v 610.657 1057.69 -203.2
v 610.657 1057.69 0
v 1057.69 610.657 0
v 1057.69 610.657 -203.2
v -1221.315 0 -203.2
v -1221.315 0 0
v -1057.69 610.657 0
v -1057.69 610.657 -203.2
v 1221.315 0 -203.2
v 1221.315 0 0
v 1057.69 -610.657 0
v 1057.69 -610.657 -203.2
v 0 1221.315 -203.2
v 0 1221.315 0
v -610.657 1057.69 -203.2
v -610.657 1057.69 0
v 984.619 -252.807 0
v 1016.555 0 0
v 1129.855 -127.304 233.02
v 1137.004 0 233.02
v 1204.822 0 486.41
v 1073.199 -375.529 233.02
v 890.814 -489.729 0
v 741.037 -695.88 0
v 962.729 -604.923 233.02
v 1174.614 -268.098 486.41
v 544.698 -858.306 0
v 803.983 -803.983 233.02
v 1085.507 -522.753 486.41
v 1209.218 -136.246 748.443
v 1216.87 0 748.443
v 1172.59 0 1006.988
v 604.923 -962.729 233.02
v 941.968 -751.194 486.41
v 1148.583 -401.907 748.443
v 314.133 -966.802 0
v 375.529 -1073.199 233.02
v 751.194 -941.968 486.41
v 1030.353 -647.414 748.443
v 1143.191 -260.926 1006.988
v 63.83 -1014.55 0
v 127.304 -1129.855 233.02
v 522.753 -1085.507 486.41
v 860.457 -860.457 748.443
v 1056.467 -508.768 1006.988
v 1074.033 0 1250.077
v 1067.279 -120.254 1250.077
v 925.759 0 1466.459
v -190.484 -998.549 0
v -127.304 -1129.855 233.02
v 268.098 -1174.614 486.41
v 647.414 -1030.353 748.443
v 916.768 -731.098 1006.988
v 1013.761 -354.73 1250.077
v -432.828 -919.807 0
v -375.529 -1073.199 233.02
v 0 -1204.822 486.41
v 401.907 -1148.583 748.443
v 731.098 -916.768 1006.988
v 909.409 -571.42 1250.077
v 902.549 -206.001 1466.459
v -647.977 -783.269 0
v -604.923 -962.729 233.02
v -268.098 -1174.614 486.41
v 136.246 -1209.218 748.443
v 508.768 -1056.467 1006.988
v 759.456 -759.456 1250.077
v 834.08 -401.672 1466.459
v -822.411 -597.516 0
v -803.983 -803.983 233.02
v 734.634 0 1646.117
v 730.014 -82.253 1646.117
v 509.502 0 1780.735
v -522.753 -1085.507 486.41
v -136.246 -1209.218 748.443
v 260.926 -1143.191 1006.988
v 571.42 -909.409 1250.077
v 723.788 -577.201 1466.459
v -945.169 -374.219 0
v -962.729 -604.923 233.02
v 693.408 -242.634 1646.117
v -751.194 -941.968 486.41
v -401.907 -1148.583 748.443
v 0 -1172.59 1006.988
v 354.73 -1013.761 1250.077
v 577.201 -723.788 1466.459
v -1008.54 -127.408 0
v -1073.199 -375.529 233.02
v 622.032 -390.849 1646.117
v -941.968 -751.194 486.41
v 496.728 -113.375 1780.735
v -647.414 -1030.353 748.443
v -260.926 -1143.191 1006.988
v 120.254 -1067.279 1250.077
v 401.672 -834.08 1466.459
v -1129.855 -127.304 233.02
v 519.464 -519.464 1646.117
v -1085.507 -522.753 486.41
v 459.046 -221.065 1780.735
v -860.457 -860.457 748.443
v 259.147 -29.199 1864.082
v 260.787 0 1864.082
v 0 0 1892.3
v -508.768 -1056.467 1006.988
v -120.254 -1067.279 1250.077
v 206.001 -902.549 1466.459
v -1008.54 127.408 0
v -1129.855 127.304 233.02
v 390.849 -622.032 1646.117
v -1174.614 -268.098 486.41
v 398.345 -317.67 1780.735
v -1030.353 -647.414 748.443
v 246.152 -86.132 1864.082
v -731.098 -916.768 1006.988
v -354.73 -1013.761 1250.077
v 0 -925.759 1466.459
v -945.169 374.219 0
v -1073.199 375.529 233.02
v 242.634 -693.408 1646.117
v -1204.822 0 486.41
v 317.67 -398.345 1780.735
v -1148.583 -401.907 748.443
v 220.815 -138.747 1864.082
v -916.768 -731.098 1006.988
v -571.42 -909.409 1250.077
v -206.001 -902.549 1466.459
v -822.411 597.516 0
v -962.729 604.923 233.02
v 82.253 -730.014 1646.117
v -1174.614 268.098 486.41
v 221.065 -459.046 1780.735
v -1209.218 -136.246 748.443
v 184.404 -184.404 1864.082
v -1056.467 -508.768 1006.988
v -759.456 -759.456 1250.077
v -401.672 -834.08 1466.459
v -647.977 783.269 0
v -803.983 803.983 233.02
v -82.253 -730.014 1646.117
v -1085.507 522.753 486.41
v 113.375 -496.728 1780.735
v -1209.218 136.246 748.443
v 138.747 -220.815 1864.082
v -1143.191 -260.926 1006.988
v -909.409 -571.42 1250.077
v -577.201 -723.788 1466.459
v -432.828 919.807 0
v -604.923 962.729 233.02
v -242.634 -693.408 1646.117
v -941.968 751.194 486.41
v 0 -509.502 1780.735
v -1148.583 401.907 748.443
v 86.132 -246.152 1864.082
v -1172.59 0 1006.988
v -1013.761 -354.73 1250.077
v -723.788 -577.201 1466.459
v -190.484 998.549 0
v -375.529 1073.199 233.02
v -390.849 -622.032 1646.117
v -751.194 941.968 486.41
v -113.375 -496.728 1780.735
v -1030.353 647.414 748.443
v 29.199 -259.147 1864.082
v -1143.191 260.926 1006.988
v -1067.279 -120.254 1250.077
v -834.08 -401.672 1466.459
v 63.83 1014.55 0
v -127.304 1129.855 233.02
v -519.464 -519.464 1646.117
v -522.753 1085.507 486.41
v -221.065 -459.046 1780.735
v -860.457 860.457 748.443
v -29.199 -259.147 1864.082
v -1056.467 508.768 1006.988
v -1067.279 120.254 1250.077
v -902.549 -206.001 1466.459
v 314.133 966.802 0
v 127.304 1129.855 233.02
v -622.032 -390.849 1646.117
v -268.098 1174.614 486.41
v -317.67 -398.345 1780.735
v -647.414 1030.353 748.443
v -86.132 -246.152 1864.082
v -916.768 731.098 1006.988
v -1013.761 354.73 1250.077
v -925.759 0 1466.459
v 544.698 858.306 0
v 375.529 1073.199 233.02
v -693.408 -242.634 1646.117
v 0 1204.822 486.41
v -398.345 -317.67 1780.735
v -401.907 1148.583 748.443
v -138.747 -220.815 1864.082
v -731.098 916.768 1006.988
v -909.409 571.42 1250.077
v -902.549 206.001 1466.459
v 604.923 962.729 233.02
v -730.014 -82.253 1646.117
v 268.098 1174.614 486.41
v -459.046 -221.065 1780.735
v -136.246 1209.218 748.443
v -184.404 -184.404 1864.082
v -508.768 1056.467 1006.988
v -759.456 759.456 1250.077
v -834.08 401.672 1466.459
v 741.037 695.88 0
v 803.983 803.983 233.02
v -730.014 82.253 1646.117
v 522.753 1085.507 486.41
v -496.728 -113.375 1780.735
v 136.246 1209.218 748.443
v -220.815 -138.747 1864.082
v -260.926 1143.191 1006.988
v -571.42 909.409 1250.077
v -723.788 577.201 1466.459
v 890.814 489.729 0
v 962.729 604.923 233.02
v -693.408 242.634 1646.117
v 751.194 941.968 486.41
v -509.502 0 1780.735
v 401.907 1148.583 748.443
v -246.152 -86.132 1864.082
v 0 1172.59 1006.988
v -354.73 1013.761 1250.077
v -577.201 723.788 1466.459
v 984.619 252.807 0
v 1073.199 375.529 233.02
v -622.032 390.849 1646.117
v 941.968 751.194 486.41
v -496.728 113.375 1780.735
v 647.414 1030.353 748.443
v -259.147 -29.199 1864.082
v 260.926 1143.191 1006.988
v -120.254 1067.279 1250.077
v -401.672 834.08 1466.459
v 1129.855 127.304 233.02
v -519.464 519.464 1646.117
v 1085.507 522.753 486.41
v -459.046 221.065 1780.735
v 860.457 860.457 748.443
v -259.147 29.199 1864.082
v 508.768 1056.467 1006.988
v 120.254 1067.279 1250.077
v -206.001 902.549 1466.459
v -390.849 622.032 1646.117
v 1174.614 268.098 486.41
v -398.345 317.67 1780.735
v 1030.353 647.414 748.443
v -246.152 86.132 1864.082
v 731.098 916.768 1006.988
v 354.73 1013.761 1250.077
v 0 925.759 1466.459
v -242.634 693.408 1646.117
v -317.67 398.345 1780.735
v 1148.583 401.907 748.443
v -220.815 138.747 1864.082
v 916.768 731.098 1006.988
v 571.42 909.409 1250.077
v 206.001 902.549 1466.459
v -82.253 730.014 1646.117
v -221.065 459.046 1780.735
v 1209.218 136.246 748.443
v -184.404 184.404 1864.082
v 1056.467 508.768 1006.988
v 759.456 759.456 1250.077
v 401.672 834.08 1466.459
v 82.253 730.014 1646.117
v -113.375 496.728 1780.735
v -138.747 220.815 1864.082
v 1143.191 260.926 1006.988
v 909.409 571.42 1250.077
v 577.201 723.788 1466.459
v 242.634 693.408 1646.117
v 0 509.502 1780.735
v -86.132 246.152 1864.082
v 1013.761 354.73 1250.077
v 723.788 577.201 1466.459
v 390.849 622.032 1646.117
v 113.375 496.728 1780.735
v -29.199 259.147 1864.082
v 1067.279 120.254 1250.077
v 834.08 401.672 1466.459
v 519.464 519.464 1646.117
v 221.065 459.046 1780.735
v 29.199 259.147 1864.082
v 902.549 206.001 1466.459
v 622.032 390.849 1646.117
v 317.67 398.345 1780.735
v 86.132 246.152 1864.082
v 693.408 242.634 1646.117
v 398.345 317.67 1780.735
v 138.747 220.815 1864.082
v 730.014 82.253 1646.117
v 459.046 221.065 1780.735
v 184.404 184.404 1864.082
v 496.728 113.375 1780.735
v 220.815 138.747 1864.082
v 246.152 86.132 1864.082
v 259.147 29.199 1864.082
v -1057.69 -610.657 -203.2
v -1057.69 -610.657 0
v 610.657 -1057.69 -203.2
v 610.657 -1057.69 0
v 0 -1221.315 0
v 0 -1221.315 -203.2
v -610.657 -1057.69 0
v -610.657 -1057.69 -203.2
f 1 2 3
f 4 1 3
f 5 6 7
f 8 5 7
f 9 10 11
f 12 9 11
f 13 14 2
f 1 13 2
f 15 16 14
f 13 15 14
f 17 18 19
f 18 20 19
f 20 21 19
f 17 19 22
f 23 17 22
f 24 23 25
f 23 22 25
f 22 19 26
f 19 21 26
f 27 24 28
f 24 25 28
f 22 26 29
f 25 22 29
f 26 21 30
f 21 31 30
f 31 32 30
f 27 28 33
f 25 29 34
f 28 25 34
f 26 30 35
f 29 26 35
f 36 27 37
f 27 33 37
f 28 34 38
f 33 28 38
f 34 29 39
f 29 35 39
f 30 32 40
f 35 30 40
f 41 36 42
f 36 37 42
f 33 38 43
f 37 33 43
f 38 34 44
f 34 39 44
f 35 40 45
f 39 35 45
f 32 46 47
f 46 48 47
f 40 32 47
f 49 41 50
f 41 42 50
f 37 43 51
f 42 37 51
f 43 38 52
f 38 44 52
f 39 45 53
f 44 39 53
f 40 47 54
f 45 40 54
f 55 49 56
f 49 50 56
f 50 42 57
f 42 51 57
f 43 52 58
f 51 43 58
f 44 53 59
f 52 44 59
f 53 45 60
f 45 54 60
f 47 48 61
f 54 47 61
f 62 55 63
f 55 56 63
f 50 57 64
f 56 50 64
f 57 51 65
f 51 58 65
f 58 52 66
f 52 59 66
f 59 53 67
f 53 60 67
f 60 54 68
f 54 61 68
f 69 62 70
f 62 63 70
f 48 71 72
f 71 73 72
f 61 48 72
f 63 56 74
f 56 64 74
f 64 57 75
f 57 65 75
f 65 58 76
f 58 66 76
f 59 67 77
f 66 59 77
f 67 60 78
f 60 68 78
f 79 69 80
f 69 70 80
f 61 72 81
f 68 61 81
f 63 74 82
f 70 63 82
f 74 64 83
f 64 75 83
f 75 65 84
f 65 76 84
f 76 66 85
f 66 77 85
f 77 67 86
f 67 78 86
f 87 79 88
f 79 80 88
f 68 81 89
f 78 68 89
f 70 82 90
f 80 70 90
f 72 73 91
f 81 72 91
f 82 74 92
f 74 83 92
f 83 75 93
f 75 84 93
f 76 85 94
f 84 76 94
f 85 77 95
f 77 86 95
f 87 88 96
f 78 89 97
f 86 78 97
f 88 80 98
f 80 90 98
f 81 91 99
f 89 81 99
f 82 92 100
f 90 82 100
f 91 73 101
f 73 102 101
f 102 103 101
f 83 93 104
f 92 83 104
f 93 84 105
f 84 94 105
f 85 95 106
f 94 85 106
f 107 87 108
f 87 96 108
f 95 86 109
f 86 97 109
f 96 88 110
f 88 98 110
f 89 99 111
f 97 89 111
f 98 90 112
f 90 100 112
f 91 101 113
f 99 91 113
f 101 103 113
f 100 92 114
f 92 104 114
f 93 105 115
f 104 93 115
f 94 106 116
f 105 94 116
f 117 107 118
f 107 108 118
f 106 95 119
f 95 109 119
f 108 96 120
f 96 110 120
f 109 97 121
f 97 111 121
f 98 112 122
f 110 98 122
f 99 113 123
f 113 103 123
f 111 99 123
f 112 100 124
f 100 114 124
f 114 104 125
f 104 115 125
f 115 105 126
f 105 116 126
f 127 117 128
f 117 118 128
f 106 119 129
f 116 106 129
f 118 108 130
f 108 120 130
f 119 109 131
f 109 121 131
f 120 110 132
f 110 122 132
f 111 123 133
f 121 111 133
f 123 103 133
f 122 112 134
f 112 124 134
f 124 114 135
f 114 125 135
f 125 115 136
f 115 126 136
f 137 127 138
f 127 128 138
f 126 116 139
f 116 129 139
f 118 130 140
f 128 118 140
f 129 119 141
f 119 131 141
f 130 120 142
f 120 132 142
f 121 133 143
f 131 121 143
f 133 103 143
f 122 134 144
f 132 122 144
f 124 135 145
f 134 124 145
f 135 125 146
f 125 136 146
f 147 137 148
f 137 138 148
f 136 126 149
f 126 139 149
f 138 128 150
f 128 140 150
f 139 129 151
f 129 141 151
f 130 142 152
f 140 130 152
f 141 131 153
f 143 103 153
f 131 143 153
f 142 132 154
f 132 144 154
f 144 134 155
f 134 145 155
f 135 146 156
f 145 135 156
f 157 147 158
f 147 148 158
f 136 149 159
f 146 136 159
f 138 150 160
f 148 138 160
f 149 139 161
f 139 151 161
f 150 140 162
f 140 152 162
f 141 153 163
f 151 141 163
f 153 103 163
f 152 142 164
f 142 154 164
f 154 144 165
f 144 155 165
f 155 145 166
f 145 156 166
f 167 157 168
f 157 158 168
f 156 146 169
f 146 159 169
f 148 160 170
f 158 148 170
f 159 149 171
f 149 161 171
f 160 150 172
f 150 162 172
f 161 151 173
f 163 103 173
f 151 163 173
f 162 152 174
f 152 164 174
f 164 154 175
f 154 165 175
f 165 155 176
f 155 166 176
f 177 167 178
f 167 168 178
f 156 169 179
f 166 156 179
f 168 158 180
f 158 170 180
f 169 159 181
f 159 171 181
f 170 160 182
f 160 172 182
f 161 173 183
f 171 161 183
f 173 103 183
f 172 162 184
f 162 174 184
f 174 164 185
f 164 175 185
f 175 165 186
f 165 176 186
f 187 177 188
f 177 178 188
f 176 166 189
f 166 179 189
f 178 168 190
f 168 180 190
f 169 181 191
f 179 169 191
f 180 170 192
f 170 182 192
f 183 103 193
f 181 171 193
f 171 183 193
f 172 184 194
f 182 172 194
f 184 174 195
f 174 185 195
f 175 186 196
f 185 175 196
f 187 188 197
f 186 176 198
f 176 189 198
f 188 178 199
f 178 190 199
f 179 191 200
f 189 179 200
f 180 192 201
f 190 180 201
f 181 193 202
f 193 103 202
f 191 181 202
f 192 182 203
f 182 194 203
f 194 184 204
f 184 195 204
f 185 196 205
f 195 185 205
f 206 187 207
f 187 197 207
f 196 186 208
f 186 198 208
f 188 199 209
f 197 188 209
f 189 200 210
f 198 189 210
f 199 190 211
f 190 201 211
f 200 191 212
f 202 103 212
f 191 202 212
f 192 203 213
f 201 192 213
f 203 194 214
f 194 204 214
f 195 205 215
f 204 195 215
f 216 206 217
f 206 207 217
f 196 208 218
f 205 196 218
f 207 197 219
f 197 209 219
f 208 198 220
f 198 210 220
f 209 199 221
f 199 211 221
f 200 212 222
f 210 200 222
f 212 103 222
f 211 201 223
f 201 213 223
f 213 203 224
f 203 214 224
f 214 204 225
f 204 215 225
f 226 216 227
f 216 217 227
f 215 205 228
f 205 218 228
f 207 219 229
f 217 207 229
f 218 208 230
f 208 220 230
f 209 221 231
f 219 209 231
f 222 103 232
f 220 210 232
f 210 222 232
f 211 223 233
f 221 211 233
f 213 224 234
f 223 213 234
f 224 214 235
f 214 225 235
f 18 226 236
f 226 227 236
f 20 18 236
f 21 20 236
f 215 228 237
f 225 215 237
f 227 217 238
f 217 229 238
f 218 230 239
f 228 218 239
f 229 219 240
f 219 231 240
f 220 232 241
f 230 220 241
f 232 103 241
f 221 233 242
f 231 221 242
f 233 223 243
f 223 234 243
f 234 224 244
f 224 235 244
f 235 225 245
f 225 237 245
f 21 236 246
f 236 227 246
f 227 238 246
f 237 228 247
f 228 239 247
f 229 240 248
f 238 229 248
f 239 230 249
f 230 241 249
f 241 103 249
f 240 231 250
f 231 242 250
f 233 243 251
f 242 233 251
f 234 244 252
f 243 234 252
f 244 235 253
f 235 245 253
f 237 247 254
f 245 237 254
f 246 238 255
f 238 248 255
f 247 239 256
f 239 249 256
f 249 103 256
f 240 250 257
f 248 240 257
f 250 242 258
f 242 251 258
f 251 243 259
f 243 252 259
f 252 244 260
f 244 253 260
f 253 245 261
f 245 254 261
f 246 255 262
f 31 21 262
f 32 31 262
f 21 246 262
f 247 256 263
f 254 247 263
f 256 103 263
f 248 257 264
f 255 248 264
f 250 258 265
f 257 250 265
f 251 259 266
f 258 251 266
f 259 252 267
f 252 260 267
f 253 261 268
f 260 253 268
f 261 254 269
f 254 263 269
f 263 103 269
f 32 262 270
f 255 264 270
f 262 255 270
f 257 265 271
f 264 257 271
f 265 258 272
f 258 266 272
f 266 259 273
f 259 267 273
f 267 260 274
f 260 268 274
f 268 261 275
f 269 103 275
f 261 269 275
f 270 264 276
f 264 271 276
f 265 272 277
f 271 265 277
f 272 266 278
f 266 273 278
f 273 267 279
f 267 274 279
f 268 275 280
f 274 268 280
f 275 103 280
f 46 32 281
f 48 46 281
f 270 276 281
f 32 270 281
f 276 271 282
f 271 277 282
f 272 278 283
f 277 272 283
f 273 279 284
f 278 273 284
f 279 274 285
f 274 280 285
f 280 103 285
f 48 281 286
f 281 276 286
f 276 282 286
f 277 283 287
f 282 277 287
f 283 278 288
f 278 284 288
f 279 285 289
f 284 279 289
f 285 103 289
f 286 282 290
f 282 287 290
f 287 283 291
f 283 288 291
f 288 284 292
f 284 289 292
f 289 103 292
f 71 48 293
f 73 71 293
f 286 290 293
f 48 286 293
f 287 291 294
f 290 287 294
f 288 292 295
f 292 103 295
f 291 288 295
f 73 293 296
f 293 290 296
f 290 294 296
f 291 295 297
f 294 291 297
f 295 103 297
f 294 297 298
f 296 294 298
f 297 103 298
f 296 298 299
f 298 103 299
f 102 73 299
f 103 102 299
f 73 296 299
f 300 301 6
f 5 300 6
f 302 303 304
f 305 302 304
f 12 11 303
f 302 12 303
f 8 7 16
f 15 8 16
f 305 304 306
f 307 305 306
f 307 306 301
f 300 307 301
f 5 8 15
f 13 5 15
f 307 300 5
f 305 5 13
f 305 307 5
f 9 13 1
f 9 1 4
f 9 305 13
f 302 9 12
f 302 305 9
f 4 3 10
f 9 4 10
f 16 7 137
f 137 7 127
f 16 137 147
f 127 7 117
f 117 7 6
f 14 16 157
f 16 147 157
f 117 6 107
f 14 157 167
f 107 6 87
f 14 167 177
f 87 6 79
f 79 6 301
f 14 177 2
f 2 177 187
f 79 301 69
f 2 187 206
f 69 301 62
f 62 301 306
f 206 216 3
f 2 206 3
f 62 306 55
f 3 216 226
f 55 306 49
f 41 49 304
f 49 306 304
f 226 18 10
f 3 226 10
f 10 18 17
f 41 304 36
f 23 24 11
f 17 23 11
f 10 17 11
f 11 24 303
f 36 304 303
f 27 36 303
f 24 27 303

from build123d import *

# Parameters (mm, degrees)
F2_R     = 1524
F3_DEPTH = 914.4
F5_DEPTH = 203.2


with BuildPart() as f1:
    # F0 (on Front) → F1 (revolve)
    with BuildSketch(Plane.XZ):
        with BuildLine():
            Line((0, 1892.3), (0, -546.1))
            ThreePointArc((0, -546.1), (1219.2, 673.1), (0, 1892.3))
        make_face()
    revolve(axis=Axis((0, 0, 673.1), (0, 0, -1)))

    # F2 (on Top) → F3 (cut)
    with BuildSketch(Plane.XY):
        Circle(F2_R)
    extrude(amount=-F3_DEPTH, mode=Mode.SUBTRACT)

    # F4 (on face) → F5 (join)
    with BuildSketch(Plane(origin=(0, 0, 0), x_dir=(1, 0, 0), z_dir=(0, 0, -1))):
        Polygon((1221.314832, 0), (1057.689671, 610.657416), (610.657416, 1057.689671), (0, 1221.314832), (-610.657416, 1057.689671), (-1057.689671, 610.657416), (-1221.314832, 0), (-1057.689671, -610.657416), (-610.657416, -1057.689671), (0, -1221.314832), (610.657416, -1057.689671), (1057.689671, -610.657416), align=None)
    extrude(amount=F5_DEPTH)


solid = f1.part
